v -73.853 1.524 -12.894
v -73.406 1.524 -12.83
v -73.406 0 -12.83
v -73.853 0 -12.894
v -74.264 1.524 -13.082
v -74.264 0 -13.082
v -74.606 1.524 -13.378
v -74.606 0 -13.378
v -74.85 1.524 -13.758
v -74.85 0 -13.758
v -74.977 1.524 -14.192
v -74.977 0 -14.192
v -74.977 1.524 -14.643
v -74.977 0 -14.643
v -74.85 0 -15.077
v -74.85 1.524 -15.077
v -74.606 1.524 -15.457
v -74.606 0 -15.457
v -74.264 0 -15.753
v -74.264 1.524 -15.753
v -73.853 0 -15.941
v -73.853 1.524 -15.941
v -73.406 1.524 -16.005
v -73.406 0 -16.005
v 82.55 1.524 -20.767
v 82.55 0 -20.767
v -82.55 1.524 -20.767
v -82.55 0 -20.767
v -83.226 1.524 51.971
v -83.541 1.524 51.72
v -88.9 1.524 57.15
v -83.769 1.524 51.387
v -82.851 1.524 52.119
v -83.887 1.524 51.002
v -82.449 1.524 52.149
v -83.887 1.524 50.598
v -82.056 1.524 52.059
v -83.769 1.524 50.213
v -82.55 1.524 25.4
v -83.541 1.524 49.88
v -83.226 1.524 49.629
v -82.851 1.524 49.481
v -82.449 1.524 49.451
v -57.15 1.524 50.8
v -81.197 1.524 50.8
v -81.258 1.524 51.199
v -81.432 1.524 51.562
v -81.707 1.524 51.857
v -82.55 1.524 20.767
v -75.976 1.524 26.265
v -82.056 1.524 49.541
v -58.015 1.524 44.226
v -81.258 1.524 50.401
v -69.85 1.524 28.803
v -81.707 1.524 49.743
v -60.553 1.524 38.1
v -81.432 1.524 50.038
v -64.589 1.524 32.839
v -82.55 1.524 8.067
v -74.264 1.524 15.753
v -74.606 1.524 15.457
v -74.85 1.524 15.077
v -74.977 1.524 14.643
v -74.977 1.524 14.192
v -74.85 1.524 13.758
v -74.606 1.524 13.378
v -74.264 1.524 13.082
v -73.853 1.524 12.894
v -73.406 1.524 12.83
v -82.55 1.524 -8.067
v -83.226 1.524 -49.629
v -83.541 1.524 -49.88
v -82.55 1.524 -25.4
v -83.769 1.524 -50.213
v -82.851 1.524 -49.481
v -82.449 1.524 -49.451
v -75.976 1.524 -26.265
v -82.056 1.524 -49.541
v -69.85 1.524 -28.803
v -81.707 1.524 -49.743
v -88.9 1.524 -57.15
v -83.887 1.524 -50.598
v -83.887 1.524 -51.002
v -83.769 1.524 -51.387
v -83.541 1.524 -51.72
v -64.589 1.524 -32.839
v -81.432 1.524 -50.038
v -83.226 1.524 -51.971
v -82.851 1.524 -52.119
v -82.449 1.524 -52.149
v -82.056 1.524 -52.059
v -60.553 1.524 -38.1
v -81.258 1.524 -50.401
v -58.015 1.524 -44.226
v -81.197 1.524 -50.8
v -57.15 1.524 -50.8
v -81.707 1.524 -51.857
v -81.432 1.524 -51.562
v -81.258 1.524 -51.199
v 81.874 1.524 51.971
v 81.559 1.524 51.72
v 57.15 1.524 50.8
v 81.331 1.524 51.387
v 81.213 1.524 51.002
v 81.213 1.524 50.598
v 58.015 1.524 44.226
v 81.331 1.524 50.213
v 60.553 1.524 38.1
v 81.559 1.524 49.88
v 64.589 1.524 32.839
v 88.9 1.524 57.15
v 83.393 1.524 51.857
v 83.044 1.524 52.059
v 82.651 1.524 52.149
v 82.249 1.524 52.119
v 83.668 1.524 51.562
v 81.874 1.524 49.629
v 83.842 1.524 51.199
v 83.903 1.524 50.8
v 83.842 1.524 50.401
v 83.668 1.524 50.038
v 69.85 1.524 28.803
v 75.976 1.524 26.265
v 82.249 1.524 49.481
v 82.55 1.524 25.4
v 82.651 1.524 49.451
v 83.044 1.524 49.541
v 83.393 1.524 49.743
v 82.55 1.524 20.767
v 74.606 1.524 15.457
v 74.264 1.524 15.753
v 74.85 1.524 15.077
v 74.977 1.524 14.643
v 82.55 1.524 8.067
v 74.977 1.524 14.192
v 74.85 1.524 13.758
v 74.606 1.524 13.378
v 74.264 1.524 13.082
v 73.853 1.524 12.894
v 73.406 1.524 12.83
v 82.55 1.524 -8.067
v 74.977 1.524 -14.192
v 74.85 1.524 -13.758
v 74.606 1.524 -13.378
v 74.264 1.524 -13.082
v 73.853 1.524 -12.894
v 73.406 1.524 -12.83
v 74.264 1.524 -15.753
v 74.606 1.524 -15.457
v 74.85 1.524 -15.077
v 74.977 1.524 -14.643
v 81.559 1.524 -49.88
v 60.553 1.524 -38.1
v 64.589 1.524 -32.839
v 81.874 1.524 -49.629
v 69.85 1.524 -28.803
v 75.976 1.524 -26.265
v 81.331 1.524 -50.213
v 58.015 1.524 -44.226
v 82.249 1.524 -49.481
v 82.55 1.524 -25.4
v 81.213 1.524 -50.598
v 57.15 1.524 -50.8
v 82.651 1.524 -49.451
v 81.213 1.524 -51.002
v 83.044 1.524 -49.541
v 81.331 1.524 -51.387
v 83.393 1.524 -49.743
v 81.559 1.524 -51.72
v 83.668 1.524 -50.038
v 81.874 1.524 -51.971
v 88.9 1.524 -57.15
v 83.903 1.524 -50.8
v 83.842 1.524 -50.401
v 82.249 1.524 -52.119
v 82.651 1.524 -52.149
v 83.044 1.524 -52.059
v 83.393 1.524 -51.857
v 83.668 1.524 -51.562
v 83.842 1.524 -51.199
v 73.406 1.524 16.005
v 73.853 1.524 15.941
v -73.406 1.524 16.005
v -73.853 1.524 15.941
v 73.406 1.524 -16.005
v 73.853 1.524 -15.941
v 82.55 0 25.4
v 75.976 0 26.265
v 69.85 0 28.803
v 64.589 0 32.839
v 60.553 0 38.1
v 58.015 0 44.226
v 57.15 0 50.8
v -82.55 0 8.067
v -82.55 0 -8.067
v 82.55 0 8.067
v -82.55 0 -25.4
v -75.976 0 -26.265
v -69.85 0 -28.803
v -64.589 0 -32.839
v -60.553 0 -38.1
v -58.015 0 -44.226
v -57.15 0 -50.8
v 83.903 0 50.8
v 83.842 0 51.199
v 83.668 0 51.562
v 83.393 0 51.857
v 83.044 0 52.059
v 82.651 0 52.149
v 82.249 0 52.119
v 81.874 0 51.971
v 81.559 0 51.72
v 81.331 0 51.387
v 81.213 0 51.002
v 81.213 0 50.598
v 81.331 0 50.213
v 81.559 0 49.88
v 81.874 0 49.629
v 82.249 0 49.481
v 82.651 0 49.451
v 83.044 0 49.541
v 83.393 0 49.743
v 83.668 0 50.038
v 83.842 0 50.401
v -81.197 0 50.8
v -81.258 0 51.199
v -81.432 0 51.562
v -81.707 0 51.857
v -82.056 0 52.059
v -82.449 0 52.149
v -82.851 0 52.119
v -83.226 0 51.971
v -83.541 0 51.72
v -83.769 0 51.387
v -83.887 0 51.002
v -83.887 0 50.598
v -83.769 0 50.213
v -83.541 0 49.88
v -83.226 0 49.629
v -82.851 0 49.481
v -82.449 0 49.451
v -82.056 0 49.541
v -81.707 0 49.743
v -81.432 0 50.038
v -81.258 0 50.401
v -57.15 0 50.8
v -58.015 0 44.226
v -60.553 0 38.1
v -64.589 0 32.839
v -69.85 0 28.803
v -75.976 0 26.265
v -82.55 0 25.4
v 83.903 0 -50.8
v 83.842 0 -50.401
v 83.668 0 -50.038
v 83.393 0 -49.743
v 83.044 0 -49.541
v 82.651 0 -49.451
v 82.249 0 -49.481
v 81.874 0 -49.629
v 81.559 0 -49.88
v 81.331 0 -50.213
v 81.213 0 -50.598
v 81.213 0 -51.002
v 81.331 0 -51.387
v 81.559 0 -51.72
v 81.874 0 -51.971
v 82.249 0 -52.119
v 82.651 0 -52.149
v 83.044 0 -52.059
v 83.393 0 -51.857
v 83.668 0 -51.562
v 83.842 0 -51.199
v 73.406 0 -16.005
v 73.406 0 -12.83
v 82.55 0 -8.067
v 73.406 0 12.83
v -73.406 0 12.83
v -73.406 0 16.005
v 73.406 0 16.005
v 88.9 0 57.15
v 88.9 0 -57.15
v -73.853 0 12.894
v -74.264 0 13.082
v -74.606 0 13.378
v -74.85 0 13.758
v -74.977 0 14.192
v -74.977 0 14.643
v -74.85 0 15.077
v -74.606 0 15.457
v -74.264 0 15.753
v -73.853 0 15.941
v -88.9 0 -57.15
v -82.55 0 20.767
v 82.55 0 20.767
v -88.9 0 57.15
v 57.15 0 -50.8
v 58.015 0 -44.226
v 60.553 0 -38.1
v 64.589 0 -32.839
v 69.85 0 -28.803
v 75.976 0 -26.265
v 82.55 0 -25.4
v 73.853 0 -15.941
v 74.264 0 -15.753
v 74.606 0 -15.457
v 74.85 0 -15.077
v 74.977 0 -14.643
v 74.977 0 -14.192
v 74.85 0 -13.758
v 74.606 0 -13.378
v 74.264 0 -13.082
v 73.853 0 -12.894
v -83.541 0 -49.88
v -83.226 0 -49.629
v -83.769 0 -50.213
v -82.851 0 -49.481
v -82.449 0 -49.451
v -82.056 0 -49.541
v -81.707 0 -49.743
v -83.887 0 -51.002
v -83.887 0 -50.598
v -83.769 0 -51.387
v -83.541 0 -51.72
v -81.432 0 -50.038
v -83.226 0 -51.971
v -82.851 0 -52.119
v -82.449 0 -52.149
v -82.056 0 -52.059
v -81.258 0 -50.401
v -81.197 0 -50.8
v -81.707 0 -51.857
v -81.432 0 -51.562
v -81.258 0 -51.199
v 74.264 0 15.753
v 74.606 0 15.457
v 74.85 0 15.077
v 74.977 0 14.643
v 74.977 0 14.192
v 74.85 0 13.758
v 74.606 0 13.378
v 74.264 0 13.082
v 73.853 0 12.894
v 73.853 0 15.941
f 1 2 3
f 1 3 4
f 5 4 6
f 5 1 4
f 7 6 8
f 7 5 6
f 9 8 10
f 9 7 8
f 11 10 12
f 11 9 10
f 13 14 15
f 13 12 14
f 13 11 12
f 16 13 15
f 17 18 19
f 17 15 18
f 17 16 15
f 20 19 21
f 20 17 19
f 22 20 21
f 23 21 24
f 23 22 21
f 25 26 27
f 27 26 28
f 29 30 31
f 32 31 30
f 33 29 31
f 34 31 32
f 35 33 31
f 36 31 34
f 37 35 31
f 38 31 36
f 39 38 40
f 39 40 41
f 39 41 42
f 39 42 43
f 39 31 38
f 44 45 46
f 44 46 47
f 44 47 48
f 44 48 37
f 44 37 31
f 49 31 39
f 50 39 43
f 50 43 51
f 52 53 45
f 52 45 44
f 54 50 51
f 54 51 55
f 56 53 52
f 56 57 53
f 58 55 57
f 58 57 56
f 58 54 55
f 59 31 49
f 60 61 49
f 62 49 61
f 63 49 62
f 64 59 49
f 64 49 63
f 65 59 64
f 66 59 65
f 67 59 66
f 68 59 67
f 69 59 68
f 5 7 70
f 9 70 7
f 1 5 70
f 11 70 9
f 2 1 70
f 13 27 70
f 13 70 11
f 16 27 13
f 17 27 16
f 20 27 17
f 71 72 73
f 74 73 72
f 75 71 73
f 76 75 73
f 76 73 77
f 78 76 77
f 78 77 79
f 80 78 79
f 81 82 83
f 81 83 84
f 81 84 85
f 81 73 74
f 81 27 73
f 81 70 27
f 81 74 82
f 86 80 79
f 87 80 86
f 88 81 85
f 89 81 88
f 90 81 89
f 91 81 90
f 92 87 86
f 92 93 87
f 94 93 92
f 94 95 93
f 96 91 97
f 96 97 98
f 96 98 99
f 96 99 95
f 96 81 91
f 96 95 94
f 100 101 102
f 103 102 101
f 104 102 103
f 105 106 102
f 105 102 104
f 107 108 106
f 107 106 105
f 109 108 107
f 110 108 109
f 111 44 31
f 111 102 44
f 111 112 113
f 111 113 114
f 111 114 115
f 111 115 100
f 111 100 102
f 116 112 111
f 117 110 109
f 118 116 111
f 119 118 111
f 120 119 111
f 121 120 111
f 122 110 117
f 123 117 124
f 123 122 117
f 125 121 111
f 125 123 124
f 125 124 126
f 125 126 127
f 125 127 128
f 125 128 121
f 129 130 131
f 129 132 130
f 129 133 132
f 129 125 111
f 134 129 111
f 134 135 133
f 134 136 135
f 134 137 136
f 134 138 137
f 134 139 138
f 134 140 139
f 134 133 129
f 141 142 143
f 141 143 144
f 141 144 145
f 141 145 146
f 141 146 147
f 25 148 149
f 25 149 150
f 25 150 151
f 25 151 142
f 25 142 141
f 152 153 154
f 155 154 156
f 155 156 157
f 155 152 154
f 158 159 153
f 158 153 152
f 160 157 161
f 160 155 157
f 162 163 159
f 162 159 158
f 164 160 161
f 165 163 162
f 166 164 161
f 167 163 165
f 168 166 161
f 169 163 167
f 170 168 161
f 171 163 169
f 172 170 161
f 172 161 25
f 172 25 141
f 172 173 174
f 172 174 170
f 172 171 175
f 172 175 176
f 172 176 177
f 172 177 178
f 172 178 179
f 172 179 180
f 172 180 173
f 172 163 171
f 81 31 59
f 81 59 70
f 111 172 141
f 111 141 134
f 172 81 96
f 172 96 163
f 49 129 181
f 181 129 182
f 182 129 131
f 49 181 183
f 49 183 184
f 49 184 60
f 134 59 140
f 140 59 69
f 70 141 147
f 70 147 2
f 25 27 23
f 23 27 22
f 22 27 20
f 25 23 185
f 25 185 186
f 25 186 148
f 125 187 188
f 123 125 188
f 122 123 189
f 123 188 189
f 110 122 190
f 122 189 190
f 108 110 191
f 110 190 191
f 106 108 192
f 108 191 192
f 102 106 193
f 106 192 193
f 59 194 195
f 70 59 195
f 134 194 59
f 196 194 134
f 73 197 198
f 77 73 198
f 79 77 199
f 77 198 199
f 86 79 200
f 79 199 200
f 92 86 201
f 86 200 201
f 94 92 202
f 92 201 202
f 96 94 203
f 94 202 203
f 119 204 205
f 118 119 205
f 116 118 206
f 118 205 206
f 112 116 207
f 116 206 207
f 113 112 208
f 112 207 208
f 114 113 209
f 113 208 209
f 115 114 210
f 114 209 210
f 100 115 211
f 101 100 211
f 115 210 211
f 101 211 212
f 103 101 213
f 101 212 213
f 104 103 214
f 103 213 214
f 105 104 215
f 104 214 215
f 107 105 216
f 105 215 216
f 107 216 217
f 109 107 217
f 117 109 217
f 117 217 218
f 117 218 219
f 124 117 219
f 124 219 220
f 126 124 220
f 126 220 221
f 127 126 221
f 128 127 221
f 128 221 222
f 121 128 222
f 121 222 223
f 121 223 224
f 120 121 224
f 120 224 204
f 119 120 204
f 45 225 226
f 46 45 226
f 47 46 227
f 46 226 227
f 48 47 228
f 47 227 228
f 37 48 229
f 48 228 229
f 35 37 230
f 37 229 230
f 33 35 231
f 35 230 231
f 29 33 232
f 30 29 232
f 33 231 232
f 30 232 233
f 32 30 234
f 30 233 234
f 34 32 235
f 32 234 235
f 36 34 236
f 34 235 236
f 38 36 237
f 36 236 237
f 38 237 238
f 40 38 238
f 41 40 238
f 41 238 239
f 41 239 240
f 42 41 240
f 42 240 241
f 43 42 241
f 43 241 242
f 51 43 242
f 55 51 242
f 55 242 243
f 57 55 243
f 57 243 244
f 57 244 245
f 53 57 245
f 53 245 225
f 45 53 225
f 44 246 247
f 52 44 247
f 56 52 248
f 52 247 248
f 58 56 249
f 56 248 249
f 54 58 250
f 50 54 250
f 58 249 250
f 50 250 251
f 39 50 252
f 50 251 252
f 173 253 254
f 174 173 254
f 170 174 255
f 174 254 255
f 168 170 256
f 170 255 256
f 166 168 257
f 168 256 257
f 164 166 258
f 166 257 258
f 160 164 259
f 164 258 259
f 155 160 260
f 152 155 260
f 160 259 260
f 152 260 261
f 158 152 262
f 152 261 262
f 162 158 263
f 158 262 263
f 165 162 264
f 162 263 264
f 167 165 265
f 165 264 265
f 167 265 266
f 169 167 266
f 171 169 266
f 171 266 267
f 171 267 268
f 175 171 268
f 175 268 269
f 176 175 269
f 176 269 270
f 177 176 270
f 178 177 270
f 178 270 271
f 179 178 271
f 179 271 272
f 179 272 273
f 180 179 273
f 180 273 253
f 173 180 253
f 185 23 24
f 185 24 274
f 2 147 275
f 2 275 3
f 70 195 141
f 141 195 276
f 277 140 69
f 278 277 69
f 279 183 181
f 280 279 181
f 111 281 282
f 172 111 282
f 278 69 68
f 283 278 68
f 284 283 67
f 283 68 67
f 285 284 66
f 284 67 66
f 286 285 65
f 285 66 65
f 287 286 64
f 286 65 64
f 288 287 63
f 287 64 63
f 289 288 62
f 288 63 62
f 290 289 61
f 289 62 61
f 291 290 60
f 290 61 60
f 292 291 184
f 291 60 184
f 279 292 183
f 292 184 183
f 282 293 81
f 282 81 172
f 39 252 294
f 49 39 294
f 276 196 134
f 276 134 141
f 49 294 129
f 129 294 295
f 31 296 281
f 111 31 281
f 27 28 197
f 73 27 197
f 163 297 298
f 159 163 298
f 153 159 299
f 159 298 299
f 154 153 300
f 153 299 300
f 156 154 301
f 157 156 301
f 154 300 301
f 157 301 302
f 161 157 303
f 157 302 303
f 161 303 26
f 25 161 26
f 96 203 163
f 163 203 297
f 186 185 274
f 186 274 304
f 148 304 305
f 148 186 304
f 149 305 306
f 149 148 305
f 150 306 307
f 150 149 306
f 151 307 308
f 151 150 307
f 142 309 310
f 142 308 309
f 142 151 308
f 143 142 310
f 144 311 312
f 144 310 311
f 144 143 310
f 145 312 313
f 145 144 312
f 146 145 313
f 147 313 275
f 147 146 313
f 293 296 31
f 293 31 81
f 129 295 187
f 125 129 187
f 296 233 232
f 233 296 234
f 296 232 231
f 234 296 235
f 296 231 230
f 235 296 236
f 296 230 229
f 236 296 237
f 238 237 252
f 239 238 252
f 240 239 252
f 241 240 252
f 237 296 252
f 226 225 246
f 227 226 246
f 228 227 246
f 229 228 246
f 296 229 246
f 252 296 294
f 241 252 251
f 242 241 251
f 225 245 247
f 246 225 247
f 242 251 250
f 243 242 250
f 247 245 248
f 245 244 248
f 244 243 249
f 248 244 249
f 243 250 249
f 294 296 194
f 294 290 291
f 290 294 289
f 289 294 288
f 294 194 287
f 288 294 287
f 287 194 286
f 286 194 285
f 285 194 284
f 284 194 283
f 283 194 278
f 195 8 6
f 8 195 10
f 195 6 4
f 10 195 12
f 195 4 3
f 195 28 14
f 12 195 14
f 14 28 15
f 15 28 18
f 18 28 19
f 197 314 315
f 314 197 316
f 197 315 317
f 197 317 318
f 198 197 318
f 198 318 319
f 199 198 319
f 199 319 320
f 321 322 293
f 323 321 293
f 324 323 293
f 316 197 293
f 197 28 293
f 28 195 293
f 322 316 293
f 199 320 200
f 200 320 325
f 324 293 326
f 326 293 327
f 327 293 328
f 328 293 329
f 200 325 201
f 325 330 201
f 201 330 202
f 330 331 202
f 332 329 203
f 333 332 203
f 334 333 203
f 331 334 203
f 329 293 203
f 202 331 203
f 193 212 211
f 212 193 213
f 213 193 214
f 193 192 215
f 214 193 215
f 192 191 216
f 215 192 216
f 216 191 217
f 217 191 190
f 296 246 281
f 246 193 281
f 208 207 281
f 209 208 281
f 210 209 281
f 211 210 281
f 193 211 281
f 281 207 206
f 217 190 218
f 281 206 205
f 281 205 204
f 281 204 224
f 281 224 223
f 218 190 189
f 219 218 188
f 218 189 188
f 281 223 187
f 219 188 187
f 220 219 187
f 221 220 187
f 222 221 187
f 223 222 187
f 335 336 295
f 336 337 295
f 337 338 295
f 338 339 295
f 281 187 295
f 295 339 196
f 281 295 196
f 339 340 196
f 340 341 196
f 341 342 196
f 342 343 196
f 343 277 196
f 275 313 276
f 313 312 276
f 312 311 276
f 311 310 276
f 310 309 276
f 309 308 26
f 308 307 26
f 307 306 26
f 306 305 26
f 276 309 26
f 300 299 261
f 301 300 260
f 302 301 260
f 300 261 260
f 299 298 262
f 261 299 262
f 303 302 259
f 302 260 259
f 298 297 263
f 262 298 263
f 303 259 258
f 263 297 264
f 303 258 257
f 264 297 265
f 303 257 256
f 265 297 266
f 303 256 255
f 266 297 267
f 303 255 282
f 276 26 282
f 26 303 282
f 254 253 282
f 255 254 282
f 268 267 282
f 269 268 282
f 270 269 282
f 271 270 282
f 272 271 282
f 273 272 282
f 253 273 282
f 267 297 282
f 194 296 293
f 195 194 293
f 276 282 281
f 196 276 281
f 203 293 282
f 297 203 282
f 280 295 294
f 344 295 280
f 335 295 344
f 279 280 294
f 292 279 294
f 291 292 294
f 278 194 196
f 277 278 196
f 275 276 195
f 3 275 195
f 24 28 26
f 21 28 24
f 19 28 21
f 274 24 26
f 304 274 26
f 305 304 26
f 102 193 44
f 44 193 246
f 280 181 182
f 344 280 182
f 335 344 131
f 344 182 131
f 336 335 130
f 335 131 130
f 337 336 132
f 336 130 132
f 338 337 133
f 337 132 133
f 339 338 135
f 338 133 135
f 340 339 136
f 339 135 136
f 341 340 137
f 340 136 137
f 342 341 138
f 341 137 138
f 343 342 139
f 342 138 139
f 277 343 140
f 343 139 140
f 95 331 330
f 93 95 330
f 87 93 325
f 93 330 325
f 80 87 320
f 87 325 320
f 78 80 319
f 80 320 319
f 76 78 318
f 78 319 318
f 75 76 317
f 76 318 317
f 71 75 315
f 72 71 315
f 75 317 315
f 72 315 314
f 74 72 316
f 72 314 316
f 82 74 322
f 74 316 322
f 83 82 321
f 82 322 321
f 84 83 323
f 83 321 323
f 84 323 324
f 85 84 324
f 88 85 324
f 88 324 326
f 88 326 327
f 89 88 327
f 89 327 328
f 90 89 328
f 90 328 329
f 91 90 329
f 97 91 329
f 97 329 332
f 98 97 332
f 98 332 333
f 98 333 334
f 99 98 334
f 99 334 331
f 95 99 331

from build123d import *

# Parameters (mm, degrees)
SKETCH1_W             = 177.8
SKETCH1_H             = 114.3
SKETCH1_W_2           = 165.1
SKETCH1_H_2           = 16.134929366
BOSS_EXTRUDE1_DEPTH   = 1.524
CUT_EXTRUDE1_DEPTH    = 2.524
F_6_32_TAPPED_HOLE1_D = 2.7051
F_6_32_TAPPED_HOLE2_D = 2.7051


with BuildPart() as part:
    # Sketch1 → Boss-Extrude1 (new body)
    with BuildSketch(Plane(origin=(0, 0, 0), x_dir=(1, 0, 0), z_dir=(0, 1, 0))):
        Rectangle(SKETCH1_W, SKETCH1_H)
        with BuildLine():
            Line((-82.55, -25.4), (-82.55, -20.767464683))
            Line((-82.55, -20.767464683), (82.55, -20.767464683))
            Line((82.55, -20.767464683), (82.55, -25.4))
            ThreePointArc((82.55, -25.4), (64.589487758, -32.839487758), (57.15, -50.8))
            Line((57.15, -50.8), (-57.15, -50.8))
            ThreePointArc((-57.15, -50.8), (-64.589487758, -32.839487758), (-82.55, -25.4))
        make_face(mode=Mode.SUBTRACT)
        Rectangle(SKETCH1_W_2, SKETCH1_H_2, mode=Mode.SUBTRACT)
        with BuildLine():
            Line((82.55, 20.767464683), (-82.55, 20.767464683))
            Line((-82.55, 20.767464683), (-82.55, 25.4))
            ThreePointArc((-82.55, 25.4), (-64.589487758, 32.839487758), (-57.15, 50.8))
            Line((-57.15, 50.8), (57.15, 50.8))
            ThreePointArc((57.15, 50.8), (64.589487758, 32.839487758), (82.55, 25.4))
            Line((82.55, 25.4), (82.55, 20.767464683))
        make_face(mode=Mode.SUBTRACT)
    extrude(amount=BOSS_EXTRUDE1_DEPTH)

    # Sketch3 → Cut-Extrude1 (cut, through all)
    with BuildSketch(Plane(origin=(0, 1.524, 0), x_dir=(1, 0, 0), z_dir=(0, 1, 0))):
        with BuildLine():
            Line((-73.406, 16.004964683), (73.406, 16.004964683))
            ThreePointArc((73.406, 16.004964683), (74.9935, 14.417464683), (73.406, 12.829964683))
            Line((73.406, 12.829964683), (-73.406, 12.829964683))
            ThreePointArc((-73.406, 12.829964683), (-74.9935, 14.417464683), (-73.406, 16.004964683))
        make_face()
        with BuildLine():
            Line((-73.406, -16.004964683), (73.406, -16.004964683))
            ThreePointArc((73.406, -16.004964683), (74.9935, -14.417464683), (73.406, -12.829964683))
            Line((73.406, -12.829964683), (-73.406, -12.829964683))
            ThreePointArc((-73.406, -12.829964683), (-74.9935, -14.417464683), (-73.406, -16.004964683))
        make_face()
    extrude(amount=-CUT_EXTRUDE1_DEPTH, mode=Mode.SUBTRACT)

    # #6-32 Tapped Hole1 (through all)
    with Locations(Plane(origin=(0, 7.8105, 0), x_dir=(-1, 0, 0), z_dir=(0, 1, 0))):
        with Locations((82.55, -50.8), (82.55, 50.8), (-82.55, 50.8), (-82.55, -50.8)):
            Hole(F_6_32_TAPPED_HOLE1_D / 2)

    # #6-32 Tapped Hole2 (through all)
    with Locations(Plane(origin=(0, 1.524, 0), x_dir=(-1, 0, 0), z_dir=(0, 1, 0))):
        with Locations((82.55, -50.8), (82.55, 50.8), (-82.55, 50.8), (-82.55, -50.8)):
            Hole(F_6_32_TAPPED_HOLE2_D / 2)


solid = part.part
